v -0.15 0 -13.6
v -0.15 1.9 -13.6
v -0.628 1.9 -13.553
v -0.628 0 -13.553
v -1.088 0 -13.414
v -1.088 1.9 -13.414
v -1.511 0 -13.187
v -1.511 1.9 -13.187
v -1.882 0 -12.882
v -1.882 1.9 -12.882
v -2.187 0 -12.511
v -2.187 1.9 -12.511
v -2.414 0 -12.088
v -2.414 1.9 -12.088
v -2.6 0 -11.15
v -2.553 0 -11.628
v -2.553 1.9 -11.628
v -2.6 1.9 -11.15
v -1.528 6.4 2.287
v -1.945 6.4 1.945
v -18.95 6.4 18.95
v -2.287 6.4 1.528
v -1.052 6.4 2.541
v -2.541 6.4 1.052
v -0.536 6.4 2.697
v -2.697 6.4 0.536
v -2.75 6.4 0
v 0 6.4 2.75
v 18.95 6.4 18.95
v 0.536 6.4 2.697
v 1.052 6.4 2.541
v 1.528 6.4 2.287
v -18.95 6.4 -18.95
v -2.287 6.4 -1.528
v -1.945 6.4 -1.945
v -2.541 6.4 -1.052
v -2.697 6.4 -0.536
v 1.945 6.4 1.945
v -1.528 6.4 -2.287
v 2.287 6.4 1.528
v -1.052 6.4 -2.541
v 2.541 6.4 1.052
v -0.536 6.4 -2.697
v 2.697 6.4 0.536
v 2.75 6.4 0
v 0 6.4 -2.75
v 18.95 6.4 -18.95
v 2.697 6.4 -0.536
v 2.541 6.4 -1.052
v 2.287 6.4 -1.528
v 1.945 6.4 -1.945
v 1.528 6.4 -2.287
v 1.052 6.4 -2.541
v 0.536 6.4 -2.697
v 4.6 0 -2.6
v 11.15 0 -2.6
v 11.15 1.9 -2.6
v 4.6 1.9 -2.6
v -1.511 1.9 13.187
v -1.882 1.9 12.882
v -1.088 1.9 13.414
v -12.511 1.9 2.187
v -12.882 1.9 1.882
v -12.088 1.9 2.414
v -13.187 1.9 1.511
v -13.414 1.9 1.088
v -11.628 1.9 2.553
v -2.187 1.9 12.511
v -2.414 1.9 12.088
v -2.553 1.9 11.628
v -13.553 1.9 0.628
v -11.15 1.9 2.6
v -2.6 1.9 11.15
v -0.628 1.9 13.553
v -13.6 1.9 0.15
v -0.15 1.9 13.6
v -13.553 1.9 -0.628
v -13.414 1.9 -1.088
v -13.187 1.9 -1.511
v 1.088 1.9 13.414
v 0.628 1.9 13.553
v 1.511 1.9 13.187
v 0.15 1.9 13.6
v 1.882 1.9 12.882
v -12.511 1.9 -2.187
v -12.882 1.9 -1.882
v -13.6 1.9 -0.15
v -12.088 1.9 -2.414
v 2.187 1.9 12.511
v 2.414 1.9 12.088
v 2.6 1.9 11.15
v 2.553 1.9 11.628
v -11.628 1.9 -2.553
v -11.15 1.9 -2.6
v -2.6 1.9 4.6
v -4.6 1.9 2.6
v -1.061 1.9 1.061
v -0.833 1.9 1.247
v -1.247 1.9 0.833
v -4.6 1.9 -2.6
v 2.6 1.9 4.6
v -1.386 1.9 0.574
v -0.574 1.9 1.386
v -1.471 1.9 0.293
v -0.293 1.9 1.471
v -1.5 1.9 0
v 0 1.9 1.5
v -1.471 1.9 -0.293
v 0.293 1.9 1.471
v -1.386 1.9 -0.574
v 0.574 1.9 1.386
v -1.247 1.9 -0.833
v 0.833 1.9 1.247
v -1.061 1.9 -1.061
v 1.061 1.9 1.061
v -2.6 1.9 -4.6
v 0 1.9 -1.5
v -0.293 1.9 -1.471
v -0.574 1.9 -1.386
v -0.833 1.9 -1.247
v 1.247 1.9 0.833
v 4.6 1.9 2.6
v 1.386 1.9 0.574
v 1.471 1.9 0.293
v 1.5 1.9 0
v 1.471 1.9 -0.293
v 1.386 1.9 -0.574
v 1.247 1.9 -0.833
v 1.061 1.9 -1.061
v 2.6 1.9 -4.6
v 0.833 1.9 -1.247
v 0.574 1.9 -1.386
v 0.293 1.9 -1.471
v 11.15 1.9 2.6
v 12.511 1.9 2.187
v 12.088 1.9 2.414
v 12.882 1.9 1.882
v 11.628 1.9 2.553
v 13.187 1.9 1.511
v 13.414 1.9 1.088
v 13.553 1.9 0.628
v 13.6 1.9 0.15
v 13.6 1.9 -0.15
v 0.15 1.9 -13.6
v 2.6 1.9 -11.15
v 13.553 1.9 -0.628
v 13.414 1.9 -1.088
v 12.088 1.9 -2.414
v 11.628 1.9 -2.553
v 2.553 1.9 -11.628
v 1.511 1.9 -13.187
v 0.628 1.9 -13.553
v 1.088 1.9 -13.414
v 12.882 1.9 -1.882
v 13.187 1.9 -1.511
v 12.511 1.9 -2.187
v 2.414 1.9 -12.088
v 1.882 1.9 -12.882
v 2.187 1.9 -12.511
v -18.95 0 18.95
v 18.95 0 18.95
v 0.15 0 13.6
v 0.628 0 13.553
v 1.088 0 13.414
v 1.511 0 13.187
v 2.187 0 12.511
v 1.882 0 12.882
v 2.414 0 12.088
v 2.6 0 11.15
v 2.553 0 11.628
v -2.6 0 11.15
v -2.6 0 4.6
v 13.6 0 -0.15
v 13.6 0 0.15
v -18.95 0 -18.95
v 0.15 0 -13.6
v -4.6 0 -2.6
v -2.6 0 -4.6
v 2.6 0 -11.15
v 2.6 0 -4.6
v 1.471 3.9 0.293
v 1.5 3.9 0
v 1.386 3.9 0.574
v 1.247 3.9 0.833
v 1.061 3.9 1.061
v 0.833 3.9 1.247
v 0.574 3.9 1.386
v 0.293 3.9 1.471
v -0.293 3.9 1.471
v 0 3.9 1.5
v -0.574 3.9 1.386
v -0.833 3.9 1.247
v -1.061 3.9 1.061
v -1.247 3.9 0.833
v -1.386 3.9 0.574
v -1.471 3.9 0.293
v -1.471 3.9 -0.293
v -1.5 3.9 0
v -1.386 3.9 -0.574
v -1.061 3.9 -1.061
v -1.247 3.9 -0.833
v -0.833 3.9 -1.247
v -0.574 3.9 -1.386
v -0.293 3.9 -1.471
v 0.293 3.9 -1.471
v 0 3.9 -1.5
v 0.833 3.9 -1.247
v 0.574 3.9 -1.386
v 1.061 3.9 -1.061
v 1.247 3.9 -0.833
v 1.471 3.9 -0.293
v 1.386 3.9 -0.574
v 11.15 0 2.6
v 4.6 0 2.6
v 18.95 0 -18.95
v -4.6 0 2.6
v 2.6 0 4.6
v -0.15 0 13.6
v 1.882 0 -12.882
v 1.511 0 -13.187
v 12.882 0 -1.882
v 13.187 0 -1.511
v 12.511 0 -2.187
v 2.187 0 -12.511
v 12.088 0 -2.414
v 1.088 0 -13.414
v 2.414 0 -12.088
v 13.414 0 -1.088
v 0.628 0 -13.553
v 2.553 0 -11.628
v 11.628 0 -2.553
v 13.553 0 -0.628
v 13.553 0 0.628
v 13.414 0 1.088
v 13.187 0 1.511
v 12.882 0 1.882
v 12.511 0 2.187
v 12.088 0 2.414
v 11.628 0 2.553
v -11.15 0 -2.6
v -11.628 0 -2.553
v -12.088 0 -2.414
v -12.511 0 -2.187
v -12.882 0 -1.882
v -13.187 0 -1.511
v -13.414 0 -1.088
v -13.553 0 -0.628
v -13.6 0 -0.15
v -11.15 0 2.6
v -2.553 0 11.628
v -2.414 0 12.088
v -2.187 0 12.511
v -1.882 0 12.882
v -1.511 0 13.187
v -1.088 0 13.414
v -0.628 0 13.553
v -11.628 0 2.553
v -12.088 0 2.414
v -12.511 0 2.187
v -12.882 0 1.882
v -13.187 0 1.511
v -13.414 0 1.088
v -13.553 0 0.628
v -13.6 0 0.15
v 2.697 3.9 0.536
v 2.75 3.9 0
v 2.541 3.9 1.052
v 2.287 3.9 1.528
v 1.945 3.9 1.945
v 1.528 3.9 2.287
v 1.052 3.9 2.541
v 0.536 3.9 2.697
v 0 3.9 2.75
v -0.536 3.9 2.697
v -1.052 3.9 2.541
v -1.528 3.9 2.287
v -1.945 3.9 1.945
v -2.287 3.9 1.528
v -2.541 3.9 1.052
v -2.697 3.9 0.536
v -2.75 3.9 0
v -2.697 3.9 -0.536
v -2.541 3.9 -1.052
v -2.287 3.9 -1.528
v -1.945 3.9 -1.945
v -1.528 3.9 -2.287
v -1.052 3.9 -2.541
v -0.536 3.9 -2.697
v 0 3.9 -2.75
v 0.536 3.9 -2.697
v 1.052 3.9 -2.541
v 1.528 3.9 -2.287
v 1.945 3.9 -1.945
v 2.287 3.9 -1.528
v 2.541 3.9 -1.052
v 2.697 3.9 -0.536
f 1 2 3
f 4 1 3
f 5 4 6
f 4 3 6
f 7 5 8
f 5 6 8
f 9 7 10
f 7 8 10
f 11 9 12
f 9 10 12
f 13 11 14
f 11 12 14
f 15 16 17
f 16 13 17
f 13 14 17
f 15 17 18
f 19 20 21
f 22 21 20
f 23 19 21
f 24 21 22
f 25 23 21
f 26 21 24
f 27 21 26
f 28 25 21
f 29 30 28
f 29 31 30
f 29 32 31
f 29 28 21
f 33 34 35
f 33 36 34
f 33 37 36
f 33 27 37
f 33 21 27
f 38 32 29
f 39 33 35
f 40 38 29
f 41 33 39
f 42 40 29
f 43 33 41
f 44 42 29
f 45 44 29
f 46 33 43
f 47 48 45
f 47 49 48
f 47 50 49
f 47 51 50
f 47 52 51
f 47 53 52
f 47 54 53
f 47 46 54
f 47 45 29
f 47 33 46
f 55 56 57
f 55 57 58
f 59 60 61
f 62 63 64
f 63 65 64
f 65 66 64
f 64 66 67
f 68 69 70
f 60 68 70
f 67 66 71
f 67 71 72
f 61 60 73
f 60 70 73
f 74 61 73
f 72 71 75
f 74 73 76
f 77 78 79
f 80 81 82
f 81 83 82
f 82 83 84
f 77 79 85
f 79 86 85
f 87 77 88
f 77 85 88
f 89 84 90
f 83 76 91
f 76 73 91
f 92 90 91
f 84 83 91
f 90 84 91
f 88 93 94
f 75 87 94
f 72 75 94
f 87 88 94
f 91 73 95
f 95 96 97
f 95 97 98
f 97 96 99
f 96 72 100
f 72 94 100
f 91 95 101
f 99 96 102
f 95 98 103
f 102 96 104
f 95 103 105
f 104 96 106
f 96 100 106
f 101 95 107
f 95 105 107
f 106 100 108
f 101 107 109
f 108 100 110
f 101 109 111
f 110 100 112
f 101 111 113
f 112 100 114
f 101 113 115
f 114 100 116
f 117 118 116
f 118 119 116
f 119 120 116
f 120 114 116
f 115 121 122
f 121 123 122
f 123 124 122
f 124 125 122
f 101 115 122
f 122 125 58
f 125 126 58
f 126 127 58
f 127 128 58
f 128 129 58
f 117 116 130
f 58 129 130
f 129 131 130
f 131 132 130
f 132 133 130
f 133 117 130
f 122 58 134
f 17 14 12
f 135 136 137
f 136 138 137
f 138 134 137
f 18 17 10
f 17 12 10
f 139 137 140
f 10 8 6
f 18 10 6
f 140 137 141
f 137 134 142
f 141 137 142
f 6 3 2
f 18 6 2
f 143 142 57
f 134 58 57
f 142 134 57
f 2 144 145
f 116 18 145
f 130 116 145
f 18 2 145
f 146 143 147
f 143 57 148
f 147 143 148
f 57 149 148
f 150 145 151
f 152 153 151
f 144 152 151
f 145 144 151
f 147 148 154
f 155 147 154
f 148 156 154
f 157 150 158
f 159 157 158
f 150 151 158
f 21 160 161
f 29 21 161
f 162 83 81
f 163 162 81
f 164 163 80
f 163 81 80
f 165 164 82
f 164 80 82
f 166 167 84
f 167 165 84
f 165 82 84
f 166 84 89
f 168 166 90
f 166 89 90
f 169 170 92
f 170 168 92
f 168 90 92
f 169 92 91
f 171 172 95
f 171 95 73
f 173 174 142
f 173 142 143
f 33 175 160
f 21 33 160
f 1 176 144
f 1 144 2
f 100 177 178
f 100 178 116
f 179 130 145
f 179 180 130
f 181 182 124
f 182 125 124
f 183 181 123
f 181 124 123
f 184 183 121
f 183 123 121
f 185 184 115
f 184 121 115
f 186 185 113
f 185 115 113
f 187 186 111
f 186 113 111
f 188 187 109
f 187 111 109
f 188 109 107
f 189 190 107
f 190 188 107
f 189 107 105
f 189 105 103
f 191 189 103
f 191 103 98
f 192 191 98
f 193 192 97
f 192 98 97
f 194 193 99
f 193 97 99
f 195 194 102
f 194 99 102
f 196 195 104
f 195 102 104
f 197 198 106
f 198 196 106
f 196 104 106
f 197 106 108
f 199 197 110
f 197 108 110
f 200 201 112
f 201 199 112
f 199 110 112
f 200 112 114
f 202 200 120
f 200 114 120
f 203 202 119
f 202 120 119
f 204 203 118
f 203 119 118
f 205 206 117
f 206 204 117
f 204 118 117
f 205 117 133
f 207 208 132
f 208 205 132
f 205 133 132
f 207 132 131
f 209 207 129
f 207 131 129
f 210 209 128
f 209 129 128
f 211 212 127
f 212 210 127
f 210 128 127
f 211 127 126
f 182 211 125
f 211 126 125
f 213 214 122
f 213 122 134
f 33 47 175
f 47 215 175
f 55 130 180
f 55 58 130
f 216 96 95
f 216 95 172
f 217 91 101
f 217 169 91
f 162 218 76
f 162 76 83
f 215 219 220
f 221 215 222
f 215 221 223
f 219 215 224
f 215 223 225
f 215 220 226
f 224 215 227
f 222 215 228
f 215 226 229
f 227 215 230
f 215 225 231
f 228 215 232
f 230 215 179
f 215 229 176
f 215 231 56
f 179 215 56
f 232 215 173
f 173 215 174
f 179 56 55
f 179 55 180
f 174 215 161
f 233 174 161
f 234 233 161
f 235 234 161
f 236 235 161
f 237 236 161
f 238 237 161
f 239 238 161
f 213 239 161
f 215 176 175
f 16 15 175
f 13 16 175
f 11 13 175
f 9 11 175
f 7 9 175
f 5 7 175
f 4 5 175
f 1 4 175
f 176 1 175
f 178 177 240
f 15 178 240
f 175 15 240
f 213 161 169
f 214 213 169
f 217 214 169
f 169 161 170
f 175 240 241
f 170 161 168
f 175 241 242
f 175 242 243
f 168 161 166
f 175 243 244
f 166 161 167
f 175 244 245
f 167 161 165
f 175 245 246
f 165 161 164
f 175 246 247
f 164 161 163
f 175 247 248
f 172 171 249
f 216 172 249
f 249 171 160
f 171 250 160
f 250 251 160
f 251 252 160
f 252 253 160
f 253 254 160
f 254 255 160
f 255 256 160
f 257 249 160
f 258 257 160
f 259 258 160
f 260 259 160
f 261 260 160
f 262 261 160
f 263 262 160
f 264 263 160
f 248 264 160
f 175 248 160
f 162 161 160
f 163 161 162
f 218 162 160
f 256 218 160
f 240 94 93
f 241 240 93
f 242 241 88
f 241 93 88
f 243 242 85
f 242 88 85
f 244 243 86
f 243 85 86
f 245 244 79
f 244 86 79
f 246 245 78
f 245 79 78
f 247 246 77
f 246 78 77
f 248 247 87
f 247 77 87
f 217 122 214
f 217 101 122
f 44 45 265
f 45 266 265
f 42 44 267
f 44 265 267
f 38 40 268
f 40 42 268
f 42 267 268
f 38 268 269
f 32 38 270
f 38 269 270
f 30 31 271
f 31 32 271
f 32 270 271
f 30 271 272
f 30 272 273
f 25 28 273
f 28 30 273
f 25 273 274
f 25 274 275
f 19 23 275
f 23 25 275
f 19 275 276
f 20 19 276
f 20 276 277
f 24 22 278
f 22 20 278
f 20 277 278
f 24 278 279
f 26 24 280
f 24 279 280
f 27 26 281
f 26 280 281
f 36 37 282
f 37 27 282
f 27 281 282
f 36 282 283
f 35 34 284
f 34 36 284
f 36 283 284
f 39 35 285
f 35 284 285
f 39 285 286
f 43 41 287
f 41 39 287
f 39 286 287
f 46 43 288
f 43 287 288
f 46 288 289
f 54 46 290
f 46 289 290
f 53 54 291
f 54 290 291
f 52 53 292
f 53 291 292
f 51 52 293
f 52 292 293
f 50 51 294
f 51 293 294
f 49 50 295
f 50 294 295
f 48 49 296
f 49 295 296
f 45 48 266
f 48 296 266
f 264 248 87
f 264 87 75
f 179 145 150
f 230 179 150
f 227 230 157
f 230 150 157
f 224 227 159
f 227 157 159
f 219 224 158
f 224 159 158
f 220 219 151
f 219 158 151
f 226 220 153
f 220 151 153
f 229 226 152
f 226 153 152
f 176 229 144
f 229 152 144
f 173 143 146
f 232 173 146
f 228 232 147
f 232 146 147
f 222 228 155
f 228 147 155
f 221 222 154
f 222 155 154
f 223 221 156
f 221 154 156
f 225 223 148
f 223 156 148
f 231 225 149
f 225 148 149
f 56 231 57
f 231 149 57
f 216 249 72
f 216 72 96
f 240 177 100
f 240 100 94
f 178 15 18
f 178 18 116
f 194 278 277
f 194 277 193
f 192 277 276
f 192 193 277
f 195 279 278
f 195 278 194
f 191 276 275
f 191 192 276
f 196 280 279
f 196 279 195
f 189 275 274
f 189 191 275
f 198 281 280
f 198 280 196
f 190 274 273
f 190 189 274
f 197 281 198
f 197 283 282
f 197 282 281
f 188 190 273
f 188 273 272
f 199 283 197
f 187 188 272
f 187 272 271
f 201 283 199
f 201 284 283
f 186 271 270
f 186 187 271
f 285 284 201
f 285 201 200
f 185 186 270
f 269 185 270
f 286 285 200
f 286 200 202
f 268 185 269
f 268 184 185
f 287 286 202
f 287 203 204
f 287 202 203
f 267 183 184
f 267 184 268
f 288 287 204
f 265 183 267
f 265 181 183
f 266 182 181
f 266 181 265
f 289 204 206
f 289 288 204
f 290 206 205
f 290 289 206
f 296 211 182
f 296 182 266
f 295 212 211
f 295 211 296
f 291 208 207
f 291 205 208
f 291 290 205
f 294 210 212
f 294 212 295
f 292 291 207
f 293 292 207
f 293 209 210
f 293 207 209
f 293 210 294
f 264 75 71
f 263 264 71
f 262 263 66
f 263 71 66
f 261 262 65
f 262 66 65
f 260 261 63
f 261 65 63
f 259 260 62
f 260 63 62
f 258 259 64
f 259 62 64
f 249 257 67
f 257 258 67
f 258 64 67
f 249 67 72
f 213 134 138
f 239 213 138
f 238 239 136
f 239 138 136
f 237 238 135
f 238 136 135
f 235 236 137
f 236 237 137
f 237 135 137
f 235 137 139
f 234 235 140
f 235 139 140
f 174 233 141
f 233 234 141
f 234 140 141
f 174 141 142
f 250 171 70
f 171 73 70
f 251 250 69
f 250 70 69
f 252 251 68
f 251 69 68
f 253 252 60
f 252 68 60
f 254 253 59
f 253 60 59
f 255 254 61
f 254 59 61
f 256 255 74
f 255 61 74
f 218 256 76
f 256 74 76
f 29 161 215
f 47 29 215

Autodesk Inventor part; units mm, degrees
ref_plane "YZ Plane" through (0, 0, 0) normal (1, 0, 0) x (0, 1, 0)
ref_plane "XZ Plane" through (0, 0, 0) normal (0, 1, 0) x (-1, 0, 0)
ref_plane "XY Plane" through (0, 0, 0) normal (0, 0, 1) x (1, 0, 0)
sketch "Sketch1" plane through (0, 0, 0) normal (0, 1, 0) x (-1, 0, 0)
  line L0 (-18.95, -18.95) -> (18.95, -18.95)
  line L1 (18.95, -18.95) -> (18.95, 18.95)
  line L2 (18.95, 18.95) -> (-18.95, 18.95)
  line L3 (-18.95, 18.95) -> (-18.95, -18.95)
  line L4 (-18.95, -18.95) -> (18.95, 18.95) construction
  line L5 (18.95, -18.95) -> (-18.95, 18.95) construction
  line L6 (-2.45, -13.45) -> (2.45, -13.45) construction
  line L7 (2.45, -13.45) -> (2.45, 13.45) construction
  line L8 (2.45, 13.45) -> (-2.45, 13.45) construction
  line L9 (-2.45, 13.45) -> (-2.45, -13.45) construction
  line L10 (-2.45, -13.45) -> (2.45, 13.45) construction
  line L11 (2.45, -13.45) -> (-2.45, 13.45) construction
  line L12 (-13.45, -2.45) -> (13.45, -2.45) construction
  line L13 (13.45, -2.45) -> (13.45, 2.45) construction
  line L14 (13.45, 2.45) -> (-13.45, 2.45) construction
  line L15 (-13.45, 2.45) -> (-13.45, -2.45) construction
  line L16 (-13.45, -2.45) -> (13.45, 2.45) construction
  line L17 (13.45, -2.45) -> (-13.45, 2.45) construction
  line L18 (-13.6, -2.6) -> (13.6, -2.6)
  line L19 (13.6, -2.6) -> (13.6, 2.6)
  line L20 (13.6, 2.6) -> (-13.6, 2.6)
  line L21 (-13.6, 2.6) -> (-13.6, -2.6)
  line L22 (-13.6, -2.6) -> (13.6, 2.6) construction
  line L23 (13.6, -2.6) -> (-13.6, 2.6) construction
  line L24 (-2.6, -13.6) -> (2.6, -13.6)
  line L25 (2.6, -13.6) -> (2.6, 13.6)
  line L26 (2.6, 13.6) -> (-2.6, 13.6)
  line L27 (-2.6, 13.6) -> (-2.6, -13.6)
  line L28 (-2.6, -13.6) -> (2.6, 13.6) construction
  line L29 (2.6, -13.6) -> (-2.6, 13.6) construction
  point P0 (0, 0)
  point P1 (0, 0)
  dimension "d0" = 37.9
  dimension "d1" = 4.9
  dimension "d2" = 11
  dimension "d3" = 0.15
  dimension "d4" = 0.15
extrude "Extrusion1" add sketch "Sketch1" along normal blind 1.9
sketch "Sketch2" plane through (0, 1.9, 0) normal (0, 1, 0) x (1, 0, 0)
  line L0 (18.95, 18.95) -> (-18.95, 18.95) projected
  line L1 (-18.95, 18.95) -> (-18.95, -18.95) projected
  line L2 (-18.95, -18.95) -> (18.95, -18.95) projected
  line L3 (18.95, -18.95) -> (18.95, 18.95) projected
  circle A0 centre (0, 0) radius 1.5
  dimension "d7" = 3
extrude "Extrusion2" add sketch "Sketch2" along normal blind 2
sketch "Sketch3" plane through (0, 3.9, 0) normal (0, 1, 0) x (1, 0, 0)
  circle A0 centre (0, 0) radius 1.5 projected
  line L0 (18.95, 18.95) -> (-18.95, 18.95) projected
  line L1 (-18.95, 18.95) -> (-18.95, -18.95) projected
  line L2 (-18.95, -18.95) -> (18.95, -18.95) projected
  line L3 (18.95, -18.95) -> (18.95, 18.95) projected
  circle A1 centre (0, 0) radius 2.75
  dimension "d10" = 5.5
extrude "Extrusion3" add sketch "Sketch3" along normal blind 2.5 contours L3 L2 L1 L0
chamfer "Chamfer1" distance 2 angle 45 1 edges at (-2.6, 0.95, -2.6)
fillet "Fillet1" radius 2.45 1 edges at (-13.6, 0.95, -2.6)
fillet "Fillet2" radius 2.45 1 edges at (-2.6, 0.95, -13.6)
chamfer "Chamfer2" distance 2 angle 45 1 edges at (2.6, 0.95, -2.6)
chamfer "Chamfer3" distance 2 angle 45 1 edges at (2.6, 0.95, 2.6)
fillet "Fillet3" radius 2.45 1 edges at (13.6, 0.95, -2.6)
fillet "Fillet4" radius 2.45 1 edges at (2.6, 0.95, -13.6)
fillet "Fillet5" radius 2.45 1 edges at (13.6, 0.95, 2.6)
fillet "Fillet6" radius 2.45 1 edges at (2.6, 0.95, 13.6)
chamfer "Chamfer4" distance 2 angle 45 1 edges at (-2.6, 0.95, 2.6)
fillet "Fillet7" radius 2.45 2 edges at (-2.6, 0.95, 13.6) (-13.6, 0.95, 2.6)
equation "\"d0\" = 3 * ServoArmLength + ServoArmWidth"
equation "\"d1\" = ServoArmWidth"
equation "\"d2\" = ServoArmLength"
equation "\"d3\" = ServoArmSpacing"
equation "\"d4\" = ServoArmSpacing"
equation "\"d5\" = ServoArmThickness"
equation "\"d7\" = ServoArmHoleRequired"
equation "\"d8\" = MinimalThickness"
equation "\"d10\" = ServoArmHeadScrewTrace"
equation "\"d11\" = ServoArmHeadScrewThickness"
equation "\"d13\" = ServoArmInternFillet"
equation "\"d16\" = ServoArmExternFillet"
equation "\"d17\" = ServoArmExternFillet"
equation "\"d18\" = ServoArmInternFillet"
equation "\"d21\" = ServoArmInternFillet"
equation "\"d24\" = ServoArmExternFillet"
equation "\"d25\" = ServoArmExternFillet"
equation "\"d26\" = ServoArmExternFillet"
equation "\"d27\" = ServoArmExternFillet"
equation "\"d28\" = ServoArmInternFillet"
equation "\"d31\" = ServoArmExternFillet"
equation "\"ServoArmLength\" = 11"
equation "\"ServoArmWidth\" = 4.9"
equation "\"ServoArmSpacing\" = 0.15"
equation "\"ServoArmThickness\" = 1.9"
equation "\"ServoArmHoleRequired\" = 3"
equation "\"MinimalThickness\" = 2"
equation "\"ServoArmHeadScrewTrace\" = 5.5"
equation "\"ServoArmHeadScrewThickness\" = 2.5"
equation "\"ServoArmInternFillet\" = 2"
equation "\"ServoArmExternFillet\" = 2.45"
properties part number "ServoArmTrace"
